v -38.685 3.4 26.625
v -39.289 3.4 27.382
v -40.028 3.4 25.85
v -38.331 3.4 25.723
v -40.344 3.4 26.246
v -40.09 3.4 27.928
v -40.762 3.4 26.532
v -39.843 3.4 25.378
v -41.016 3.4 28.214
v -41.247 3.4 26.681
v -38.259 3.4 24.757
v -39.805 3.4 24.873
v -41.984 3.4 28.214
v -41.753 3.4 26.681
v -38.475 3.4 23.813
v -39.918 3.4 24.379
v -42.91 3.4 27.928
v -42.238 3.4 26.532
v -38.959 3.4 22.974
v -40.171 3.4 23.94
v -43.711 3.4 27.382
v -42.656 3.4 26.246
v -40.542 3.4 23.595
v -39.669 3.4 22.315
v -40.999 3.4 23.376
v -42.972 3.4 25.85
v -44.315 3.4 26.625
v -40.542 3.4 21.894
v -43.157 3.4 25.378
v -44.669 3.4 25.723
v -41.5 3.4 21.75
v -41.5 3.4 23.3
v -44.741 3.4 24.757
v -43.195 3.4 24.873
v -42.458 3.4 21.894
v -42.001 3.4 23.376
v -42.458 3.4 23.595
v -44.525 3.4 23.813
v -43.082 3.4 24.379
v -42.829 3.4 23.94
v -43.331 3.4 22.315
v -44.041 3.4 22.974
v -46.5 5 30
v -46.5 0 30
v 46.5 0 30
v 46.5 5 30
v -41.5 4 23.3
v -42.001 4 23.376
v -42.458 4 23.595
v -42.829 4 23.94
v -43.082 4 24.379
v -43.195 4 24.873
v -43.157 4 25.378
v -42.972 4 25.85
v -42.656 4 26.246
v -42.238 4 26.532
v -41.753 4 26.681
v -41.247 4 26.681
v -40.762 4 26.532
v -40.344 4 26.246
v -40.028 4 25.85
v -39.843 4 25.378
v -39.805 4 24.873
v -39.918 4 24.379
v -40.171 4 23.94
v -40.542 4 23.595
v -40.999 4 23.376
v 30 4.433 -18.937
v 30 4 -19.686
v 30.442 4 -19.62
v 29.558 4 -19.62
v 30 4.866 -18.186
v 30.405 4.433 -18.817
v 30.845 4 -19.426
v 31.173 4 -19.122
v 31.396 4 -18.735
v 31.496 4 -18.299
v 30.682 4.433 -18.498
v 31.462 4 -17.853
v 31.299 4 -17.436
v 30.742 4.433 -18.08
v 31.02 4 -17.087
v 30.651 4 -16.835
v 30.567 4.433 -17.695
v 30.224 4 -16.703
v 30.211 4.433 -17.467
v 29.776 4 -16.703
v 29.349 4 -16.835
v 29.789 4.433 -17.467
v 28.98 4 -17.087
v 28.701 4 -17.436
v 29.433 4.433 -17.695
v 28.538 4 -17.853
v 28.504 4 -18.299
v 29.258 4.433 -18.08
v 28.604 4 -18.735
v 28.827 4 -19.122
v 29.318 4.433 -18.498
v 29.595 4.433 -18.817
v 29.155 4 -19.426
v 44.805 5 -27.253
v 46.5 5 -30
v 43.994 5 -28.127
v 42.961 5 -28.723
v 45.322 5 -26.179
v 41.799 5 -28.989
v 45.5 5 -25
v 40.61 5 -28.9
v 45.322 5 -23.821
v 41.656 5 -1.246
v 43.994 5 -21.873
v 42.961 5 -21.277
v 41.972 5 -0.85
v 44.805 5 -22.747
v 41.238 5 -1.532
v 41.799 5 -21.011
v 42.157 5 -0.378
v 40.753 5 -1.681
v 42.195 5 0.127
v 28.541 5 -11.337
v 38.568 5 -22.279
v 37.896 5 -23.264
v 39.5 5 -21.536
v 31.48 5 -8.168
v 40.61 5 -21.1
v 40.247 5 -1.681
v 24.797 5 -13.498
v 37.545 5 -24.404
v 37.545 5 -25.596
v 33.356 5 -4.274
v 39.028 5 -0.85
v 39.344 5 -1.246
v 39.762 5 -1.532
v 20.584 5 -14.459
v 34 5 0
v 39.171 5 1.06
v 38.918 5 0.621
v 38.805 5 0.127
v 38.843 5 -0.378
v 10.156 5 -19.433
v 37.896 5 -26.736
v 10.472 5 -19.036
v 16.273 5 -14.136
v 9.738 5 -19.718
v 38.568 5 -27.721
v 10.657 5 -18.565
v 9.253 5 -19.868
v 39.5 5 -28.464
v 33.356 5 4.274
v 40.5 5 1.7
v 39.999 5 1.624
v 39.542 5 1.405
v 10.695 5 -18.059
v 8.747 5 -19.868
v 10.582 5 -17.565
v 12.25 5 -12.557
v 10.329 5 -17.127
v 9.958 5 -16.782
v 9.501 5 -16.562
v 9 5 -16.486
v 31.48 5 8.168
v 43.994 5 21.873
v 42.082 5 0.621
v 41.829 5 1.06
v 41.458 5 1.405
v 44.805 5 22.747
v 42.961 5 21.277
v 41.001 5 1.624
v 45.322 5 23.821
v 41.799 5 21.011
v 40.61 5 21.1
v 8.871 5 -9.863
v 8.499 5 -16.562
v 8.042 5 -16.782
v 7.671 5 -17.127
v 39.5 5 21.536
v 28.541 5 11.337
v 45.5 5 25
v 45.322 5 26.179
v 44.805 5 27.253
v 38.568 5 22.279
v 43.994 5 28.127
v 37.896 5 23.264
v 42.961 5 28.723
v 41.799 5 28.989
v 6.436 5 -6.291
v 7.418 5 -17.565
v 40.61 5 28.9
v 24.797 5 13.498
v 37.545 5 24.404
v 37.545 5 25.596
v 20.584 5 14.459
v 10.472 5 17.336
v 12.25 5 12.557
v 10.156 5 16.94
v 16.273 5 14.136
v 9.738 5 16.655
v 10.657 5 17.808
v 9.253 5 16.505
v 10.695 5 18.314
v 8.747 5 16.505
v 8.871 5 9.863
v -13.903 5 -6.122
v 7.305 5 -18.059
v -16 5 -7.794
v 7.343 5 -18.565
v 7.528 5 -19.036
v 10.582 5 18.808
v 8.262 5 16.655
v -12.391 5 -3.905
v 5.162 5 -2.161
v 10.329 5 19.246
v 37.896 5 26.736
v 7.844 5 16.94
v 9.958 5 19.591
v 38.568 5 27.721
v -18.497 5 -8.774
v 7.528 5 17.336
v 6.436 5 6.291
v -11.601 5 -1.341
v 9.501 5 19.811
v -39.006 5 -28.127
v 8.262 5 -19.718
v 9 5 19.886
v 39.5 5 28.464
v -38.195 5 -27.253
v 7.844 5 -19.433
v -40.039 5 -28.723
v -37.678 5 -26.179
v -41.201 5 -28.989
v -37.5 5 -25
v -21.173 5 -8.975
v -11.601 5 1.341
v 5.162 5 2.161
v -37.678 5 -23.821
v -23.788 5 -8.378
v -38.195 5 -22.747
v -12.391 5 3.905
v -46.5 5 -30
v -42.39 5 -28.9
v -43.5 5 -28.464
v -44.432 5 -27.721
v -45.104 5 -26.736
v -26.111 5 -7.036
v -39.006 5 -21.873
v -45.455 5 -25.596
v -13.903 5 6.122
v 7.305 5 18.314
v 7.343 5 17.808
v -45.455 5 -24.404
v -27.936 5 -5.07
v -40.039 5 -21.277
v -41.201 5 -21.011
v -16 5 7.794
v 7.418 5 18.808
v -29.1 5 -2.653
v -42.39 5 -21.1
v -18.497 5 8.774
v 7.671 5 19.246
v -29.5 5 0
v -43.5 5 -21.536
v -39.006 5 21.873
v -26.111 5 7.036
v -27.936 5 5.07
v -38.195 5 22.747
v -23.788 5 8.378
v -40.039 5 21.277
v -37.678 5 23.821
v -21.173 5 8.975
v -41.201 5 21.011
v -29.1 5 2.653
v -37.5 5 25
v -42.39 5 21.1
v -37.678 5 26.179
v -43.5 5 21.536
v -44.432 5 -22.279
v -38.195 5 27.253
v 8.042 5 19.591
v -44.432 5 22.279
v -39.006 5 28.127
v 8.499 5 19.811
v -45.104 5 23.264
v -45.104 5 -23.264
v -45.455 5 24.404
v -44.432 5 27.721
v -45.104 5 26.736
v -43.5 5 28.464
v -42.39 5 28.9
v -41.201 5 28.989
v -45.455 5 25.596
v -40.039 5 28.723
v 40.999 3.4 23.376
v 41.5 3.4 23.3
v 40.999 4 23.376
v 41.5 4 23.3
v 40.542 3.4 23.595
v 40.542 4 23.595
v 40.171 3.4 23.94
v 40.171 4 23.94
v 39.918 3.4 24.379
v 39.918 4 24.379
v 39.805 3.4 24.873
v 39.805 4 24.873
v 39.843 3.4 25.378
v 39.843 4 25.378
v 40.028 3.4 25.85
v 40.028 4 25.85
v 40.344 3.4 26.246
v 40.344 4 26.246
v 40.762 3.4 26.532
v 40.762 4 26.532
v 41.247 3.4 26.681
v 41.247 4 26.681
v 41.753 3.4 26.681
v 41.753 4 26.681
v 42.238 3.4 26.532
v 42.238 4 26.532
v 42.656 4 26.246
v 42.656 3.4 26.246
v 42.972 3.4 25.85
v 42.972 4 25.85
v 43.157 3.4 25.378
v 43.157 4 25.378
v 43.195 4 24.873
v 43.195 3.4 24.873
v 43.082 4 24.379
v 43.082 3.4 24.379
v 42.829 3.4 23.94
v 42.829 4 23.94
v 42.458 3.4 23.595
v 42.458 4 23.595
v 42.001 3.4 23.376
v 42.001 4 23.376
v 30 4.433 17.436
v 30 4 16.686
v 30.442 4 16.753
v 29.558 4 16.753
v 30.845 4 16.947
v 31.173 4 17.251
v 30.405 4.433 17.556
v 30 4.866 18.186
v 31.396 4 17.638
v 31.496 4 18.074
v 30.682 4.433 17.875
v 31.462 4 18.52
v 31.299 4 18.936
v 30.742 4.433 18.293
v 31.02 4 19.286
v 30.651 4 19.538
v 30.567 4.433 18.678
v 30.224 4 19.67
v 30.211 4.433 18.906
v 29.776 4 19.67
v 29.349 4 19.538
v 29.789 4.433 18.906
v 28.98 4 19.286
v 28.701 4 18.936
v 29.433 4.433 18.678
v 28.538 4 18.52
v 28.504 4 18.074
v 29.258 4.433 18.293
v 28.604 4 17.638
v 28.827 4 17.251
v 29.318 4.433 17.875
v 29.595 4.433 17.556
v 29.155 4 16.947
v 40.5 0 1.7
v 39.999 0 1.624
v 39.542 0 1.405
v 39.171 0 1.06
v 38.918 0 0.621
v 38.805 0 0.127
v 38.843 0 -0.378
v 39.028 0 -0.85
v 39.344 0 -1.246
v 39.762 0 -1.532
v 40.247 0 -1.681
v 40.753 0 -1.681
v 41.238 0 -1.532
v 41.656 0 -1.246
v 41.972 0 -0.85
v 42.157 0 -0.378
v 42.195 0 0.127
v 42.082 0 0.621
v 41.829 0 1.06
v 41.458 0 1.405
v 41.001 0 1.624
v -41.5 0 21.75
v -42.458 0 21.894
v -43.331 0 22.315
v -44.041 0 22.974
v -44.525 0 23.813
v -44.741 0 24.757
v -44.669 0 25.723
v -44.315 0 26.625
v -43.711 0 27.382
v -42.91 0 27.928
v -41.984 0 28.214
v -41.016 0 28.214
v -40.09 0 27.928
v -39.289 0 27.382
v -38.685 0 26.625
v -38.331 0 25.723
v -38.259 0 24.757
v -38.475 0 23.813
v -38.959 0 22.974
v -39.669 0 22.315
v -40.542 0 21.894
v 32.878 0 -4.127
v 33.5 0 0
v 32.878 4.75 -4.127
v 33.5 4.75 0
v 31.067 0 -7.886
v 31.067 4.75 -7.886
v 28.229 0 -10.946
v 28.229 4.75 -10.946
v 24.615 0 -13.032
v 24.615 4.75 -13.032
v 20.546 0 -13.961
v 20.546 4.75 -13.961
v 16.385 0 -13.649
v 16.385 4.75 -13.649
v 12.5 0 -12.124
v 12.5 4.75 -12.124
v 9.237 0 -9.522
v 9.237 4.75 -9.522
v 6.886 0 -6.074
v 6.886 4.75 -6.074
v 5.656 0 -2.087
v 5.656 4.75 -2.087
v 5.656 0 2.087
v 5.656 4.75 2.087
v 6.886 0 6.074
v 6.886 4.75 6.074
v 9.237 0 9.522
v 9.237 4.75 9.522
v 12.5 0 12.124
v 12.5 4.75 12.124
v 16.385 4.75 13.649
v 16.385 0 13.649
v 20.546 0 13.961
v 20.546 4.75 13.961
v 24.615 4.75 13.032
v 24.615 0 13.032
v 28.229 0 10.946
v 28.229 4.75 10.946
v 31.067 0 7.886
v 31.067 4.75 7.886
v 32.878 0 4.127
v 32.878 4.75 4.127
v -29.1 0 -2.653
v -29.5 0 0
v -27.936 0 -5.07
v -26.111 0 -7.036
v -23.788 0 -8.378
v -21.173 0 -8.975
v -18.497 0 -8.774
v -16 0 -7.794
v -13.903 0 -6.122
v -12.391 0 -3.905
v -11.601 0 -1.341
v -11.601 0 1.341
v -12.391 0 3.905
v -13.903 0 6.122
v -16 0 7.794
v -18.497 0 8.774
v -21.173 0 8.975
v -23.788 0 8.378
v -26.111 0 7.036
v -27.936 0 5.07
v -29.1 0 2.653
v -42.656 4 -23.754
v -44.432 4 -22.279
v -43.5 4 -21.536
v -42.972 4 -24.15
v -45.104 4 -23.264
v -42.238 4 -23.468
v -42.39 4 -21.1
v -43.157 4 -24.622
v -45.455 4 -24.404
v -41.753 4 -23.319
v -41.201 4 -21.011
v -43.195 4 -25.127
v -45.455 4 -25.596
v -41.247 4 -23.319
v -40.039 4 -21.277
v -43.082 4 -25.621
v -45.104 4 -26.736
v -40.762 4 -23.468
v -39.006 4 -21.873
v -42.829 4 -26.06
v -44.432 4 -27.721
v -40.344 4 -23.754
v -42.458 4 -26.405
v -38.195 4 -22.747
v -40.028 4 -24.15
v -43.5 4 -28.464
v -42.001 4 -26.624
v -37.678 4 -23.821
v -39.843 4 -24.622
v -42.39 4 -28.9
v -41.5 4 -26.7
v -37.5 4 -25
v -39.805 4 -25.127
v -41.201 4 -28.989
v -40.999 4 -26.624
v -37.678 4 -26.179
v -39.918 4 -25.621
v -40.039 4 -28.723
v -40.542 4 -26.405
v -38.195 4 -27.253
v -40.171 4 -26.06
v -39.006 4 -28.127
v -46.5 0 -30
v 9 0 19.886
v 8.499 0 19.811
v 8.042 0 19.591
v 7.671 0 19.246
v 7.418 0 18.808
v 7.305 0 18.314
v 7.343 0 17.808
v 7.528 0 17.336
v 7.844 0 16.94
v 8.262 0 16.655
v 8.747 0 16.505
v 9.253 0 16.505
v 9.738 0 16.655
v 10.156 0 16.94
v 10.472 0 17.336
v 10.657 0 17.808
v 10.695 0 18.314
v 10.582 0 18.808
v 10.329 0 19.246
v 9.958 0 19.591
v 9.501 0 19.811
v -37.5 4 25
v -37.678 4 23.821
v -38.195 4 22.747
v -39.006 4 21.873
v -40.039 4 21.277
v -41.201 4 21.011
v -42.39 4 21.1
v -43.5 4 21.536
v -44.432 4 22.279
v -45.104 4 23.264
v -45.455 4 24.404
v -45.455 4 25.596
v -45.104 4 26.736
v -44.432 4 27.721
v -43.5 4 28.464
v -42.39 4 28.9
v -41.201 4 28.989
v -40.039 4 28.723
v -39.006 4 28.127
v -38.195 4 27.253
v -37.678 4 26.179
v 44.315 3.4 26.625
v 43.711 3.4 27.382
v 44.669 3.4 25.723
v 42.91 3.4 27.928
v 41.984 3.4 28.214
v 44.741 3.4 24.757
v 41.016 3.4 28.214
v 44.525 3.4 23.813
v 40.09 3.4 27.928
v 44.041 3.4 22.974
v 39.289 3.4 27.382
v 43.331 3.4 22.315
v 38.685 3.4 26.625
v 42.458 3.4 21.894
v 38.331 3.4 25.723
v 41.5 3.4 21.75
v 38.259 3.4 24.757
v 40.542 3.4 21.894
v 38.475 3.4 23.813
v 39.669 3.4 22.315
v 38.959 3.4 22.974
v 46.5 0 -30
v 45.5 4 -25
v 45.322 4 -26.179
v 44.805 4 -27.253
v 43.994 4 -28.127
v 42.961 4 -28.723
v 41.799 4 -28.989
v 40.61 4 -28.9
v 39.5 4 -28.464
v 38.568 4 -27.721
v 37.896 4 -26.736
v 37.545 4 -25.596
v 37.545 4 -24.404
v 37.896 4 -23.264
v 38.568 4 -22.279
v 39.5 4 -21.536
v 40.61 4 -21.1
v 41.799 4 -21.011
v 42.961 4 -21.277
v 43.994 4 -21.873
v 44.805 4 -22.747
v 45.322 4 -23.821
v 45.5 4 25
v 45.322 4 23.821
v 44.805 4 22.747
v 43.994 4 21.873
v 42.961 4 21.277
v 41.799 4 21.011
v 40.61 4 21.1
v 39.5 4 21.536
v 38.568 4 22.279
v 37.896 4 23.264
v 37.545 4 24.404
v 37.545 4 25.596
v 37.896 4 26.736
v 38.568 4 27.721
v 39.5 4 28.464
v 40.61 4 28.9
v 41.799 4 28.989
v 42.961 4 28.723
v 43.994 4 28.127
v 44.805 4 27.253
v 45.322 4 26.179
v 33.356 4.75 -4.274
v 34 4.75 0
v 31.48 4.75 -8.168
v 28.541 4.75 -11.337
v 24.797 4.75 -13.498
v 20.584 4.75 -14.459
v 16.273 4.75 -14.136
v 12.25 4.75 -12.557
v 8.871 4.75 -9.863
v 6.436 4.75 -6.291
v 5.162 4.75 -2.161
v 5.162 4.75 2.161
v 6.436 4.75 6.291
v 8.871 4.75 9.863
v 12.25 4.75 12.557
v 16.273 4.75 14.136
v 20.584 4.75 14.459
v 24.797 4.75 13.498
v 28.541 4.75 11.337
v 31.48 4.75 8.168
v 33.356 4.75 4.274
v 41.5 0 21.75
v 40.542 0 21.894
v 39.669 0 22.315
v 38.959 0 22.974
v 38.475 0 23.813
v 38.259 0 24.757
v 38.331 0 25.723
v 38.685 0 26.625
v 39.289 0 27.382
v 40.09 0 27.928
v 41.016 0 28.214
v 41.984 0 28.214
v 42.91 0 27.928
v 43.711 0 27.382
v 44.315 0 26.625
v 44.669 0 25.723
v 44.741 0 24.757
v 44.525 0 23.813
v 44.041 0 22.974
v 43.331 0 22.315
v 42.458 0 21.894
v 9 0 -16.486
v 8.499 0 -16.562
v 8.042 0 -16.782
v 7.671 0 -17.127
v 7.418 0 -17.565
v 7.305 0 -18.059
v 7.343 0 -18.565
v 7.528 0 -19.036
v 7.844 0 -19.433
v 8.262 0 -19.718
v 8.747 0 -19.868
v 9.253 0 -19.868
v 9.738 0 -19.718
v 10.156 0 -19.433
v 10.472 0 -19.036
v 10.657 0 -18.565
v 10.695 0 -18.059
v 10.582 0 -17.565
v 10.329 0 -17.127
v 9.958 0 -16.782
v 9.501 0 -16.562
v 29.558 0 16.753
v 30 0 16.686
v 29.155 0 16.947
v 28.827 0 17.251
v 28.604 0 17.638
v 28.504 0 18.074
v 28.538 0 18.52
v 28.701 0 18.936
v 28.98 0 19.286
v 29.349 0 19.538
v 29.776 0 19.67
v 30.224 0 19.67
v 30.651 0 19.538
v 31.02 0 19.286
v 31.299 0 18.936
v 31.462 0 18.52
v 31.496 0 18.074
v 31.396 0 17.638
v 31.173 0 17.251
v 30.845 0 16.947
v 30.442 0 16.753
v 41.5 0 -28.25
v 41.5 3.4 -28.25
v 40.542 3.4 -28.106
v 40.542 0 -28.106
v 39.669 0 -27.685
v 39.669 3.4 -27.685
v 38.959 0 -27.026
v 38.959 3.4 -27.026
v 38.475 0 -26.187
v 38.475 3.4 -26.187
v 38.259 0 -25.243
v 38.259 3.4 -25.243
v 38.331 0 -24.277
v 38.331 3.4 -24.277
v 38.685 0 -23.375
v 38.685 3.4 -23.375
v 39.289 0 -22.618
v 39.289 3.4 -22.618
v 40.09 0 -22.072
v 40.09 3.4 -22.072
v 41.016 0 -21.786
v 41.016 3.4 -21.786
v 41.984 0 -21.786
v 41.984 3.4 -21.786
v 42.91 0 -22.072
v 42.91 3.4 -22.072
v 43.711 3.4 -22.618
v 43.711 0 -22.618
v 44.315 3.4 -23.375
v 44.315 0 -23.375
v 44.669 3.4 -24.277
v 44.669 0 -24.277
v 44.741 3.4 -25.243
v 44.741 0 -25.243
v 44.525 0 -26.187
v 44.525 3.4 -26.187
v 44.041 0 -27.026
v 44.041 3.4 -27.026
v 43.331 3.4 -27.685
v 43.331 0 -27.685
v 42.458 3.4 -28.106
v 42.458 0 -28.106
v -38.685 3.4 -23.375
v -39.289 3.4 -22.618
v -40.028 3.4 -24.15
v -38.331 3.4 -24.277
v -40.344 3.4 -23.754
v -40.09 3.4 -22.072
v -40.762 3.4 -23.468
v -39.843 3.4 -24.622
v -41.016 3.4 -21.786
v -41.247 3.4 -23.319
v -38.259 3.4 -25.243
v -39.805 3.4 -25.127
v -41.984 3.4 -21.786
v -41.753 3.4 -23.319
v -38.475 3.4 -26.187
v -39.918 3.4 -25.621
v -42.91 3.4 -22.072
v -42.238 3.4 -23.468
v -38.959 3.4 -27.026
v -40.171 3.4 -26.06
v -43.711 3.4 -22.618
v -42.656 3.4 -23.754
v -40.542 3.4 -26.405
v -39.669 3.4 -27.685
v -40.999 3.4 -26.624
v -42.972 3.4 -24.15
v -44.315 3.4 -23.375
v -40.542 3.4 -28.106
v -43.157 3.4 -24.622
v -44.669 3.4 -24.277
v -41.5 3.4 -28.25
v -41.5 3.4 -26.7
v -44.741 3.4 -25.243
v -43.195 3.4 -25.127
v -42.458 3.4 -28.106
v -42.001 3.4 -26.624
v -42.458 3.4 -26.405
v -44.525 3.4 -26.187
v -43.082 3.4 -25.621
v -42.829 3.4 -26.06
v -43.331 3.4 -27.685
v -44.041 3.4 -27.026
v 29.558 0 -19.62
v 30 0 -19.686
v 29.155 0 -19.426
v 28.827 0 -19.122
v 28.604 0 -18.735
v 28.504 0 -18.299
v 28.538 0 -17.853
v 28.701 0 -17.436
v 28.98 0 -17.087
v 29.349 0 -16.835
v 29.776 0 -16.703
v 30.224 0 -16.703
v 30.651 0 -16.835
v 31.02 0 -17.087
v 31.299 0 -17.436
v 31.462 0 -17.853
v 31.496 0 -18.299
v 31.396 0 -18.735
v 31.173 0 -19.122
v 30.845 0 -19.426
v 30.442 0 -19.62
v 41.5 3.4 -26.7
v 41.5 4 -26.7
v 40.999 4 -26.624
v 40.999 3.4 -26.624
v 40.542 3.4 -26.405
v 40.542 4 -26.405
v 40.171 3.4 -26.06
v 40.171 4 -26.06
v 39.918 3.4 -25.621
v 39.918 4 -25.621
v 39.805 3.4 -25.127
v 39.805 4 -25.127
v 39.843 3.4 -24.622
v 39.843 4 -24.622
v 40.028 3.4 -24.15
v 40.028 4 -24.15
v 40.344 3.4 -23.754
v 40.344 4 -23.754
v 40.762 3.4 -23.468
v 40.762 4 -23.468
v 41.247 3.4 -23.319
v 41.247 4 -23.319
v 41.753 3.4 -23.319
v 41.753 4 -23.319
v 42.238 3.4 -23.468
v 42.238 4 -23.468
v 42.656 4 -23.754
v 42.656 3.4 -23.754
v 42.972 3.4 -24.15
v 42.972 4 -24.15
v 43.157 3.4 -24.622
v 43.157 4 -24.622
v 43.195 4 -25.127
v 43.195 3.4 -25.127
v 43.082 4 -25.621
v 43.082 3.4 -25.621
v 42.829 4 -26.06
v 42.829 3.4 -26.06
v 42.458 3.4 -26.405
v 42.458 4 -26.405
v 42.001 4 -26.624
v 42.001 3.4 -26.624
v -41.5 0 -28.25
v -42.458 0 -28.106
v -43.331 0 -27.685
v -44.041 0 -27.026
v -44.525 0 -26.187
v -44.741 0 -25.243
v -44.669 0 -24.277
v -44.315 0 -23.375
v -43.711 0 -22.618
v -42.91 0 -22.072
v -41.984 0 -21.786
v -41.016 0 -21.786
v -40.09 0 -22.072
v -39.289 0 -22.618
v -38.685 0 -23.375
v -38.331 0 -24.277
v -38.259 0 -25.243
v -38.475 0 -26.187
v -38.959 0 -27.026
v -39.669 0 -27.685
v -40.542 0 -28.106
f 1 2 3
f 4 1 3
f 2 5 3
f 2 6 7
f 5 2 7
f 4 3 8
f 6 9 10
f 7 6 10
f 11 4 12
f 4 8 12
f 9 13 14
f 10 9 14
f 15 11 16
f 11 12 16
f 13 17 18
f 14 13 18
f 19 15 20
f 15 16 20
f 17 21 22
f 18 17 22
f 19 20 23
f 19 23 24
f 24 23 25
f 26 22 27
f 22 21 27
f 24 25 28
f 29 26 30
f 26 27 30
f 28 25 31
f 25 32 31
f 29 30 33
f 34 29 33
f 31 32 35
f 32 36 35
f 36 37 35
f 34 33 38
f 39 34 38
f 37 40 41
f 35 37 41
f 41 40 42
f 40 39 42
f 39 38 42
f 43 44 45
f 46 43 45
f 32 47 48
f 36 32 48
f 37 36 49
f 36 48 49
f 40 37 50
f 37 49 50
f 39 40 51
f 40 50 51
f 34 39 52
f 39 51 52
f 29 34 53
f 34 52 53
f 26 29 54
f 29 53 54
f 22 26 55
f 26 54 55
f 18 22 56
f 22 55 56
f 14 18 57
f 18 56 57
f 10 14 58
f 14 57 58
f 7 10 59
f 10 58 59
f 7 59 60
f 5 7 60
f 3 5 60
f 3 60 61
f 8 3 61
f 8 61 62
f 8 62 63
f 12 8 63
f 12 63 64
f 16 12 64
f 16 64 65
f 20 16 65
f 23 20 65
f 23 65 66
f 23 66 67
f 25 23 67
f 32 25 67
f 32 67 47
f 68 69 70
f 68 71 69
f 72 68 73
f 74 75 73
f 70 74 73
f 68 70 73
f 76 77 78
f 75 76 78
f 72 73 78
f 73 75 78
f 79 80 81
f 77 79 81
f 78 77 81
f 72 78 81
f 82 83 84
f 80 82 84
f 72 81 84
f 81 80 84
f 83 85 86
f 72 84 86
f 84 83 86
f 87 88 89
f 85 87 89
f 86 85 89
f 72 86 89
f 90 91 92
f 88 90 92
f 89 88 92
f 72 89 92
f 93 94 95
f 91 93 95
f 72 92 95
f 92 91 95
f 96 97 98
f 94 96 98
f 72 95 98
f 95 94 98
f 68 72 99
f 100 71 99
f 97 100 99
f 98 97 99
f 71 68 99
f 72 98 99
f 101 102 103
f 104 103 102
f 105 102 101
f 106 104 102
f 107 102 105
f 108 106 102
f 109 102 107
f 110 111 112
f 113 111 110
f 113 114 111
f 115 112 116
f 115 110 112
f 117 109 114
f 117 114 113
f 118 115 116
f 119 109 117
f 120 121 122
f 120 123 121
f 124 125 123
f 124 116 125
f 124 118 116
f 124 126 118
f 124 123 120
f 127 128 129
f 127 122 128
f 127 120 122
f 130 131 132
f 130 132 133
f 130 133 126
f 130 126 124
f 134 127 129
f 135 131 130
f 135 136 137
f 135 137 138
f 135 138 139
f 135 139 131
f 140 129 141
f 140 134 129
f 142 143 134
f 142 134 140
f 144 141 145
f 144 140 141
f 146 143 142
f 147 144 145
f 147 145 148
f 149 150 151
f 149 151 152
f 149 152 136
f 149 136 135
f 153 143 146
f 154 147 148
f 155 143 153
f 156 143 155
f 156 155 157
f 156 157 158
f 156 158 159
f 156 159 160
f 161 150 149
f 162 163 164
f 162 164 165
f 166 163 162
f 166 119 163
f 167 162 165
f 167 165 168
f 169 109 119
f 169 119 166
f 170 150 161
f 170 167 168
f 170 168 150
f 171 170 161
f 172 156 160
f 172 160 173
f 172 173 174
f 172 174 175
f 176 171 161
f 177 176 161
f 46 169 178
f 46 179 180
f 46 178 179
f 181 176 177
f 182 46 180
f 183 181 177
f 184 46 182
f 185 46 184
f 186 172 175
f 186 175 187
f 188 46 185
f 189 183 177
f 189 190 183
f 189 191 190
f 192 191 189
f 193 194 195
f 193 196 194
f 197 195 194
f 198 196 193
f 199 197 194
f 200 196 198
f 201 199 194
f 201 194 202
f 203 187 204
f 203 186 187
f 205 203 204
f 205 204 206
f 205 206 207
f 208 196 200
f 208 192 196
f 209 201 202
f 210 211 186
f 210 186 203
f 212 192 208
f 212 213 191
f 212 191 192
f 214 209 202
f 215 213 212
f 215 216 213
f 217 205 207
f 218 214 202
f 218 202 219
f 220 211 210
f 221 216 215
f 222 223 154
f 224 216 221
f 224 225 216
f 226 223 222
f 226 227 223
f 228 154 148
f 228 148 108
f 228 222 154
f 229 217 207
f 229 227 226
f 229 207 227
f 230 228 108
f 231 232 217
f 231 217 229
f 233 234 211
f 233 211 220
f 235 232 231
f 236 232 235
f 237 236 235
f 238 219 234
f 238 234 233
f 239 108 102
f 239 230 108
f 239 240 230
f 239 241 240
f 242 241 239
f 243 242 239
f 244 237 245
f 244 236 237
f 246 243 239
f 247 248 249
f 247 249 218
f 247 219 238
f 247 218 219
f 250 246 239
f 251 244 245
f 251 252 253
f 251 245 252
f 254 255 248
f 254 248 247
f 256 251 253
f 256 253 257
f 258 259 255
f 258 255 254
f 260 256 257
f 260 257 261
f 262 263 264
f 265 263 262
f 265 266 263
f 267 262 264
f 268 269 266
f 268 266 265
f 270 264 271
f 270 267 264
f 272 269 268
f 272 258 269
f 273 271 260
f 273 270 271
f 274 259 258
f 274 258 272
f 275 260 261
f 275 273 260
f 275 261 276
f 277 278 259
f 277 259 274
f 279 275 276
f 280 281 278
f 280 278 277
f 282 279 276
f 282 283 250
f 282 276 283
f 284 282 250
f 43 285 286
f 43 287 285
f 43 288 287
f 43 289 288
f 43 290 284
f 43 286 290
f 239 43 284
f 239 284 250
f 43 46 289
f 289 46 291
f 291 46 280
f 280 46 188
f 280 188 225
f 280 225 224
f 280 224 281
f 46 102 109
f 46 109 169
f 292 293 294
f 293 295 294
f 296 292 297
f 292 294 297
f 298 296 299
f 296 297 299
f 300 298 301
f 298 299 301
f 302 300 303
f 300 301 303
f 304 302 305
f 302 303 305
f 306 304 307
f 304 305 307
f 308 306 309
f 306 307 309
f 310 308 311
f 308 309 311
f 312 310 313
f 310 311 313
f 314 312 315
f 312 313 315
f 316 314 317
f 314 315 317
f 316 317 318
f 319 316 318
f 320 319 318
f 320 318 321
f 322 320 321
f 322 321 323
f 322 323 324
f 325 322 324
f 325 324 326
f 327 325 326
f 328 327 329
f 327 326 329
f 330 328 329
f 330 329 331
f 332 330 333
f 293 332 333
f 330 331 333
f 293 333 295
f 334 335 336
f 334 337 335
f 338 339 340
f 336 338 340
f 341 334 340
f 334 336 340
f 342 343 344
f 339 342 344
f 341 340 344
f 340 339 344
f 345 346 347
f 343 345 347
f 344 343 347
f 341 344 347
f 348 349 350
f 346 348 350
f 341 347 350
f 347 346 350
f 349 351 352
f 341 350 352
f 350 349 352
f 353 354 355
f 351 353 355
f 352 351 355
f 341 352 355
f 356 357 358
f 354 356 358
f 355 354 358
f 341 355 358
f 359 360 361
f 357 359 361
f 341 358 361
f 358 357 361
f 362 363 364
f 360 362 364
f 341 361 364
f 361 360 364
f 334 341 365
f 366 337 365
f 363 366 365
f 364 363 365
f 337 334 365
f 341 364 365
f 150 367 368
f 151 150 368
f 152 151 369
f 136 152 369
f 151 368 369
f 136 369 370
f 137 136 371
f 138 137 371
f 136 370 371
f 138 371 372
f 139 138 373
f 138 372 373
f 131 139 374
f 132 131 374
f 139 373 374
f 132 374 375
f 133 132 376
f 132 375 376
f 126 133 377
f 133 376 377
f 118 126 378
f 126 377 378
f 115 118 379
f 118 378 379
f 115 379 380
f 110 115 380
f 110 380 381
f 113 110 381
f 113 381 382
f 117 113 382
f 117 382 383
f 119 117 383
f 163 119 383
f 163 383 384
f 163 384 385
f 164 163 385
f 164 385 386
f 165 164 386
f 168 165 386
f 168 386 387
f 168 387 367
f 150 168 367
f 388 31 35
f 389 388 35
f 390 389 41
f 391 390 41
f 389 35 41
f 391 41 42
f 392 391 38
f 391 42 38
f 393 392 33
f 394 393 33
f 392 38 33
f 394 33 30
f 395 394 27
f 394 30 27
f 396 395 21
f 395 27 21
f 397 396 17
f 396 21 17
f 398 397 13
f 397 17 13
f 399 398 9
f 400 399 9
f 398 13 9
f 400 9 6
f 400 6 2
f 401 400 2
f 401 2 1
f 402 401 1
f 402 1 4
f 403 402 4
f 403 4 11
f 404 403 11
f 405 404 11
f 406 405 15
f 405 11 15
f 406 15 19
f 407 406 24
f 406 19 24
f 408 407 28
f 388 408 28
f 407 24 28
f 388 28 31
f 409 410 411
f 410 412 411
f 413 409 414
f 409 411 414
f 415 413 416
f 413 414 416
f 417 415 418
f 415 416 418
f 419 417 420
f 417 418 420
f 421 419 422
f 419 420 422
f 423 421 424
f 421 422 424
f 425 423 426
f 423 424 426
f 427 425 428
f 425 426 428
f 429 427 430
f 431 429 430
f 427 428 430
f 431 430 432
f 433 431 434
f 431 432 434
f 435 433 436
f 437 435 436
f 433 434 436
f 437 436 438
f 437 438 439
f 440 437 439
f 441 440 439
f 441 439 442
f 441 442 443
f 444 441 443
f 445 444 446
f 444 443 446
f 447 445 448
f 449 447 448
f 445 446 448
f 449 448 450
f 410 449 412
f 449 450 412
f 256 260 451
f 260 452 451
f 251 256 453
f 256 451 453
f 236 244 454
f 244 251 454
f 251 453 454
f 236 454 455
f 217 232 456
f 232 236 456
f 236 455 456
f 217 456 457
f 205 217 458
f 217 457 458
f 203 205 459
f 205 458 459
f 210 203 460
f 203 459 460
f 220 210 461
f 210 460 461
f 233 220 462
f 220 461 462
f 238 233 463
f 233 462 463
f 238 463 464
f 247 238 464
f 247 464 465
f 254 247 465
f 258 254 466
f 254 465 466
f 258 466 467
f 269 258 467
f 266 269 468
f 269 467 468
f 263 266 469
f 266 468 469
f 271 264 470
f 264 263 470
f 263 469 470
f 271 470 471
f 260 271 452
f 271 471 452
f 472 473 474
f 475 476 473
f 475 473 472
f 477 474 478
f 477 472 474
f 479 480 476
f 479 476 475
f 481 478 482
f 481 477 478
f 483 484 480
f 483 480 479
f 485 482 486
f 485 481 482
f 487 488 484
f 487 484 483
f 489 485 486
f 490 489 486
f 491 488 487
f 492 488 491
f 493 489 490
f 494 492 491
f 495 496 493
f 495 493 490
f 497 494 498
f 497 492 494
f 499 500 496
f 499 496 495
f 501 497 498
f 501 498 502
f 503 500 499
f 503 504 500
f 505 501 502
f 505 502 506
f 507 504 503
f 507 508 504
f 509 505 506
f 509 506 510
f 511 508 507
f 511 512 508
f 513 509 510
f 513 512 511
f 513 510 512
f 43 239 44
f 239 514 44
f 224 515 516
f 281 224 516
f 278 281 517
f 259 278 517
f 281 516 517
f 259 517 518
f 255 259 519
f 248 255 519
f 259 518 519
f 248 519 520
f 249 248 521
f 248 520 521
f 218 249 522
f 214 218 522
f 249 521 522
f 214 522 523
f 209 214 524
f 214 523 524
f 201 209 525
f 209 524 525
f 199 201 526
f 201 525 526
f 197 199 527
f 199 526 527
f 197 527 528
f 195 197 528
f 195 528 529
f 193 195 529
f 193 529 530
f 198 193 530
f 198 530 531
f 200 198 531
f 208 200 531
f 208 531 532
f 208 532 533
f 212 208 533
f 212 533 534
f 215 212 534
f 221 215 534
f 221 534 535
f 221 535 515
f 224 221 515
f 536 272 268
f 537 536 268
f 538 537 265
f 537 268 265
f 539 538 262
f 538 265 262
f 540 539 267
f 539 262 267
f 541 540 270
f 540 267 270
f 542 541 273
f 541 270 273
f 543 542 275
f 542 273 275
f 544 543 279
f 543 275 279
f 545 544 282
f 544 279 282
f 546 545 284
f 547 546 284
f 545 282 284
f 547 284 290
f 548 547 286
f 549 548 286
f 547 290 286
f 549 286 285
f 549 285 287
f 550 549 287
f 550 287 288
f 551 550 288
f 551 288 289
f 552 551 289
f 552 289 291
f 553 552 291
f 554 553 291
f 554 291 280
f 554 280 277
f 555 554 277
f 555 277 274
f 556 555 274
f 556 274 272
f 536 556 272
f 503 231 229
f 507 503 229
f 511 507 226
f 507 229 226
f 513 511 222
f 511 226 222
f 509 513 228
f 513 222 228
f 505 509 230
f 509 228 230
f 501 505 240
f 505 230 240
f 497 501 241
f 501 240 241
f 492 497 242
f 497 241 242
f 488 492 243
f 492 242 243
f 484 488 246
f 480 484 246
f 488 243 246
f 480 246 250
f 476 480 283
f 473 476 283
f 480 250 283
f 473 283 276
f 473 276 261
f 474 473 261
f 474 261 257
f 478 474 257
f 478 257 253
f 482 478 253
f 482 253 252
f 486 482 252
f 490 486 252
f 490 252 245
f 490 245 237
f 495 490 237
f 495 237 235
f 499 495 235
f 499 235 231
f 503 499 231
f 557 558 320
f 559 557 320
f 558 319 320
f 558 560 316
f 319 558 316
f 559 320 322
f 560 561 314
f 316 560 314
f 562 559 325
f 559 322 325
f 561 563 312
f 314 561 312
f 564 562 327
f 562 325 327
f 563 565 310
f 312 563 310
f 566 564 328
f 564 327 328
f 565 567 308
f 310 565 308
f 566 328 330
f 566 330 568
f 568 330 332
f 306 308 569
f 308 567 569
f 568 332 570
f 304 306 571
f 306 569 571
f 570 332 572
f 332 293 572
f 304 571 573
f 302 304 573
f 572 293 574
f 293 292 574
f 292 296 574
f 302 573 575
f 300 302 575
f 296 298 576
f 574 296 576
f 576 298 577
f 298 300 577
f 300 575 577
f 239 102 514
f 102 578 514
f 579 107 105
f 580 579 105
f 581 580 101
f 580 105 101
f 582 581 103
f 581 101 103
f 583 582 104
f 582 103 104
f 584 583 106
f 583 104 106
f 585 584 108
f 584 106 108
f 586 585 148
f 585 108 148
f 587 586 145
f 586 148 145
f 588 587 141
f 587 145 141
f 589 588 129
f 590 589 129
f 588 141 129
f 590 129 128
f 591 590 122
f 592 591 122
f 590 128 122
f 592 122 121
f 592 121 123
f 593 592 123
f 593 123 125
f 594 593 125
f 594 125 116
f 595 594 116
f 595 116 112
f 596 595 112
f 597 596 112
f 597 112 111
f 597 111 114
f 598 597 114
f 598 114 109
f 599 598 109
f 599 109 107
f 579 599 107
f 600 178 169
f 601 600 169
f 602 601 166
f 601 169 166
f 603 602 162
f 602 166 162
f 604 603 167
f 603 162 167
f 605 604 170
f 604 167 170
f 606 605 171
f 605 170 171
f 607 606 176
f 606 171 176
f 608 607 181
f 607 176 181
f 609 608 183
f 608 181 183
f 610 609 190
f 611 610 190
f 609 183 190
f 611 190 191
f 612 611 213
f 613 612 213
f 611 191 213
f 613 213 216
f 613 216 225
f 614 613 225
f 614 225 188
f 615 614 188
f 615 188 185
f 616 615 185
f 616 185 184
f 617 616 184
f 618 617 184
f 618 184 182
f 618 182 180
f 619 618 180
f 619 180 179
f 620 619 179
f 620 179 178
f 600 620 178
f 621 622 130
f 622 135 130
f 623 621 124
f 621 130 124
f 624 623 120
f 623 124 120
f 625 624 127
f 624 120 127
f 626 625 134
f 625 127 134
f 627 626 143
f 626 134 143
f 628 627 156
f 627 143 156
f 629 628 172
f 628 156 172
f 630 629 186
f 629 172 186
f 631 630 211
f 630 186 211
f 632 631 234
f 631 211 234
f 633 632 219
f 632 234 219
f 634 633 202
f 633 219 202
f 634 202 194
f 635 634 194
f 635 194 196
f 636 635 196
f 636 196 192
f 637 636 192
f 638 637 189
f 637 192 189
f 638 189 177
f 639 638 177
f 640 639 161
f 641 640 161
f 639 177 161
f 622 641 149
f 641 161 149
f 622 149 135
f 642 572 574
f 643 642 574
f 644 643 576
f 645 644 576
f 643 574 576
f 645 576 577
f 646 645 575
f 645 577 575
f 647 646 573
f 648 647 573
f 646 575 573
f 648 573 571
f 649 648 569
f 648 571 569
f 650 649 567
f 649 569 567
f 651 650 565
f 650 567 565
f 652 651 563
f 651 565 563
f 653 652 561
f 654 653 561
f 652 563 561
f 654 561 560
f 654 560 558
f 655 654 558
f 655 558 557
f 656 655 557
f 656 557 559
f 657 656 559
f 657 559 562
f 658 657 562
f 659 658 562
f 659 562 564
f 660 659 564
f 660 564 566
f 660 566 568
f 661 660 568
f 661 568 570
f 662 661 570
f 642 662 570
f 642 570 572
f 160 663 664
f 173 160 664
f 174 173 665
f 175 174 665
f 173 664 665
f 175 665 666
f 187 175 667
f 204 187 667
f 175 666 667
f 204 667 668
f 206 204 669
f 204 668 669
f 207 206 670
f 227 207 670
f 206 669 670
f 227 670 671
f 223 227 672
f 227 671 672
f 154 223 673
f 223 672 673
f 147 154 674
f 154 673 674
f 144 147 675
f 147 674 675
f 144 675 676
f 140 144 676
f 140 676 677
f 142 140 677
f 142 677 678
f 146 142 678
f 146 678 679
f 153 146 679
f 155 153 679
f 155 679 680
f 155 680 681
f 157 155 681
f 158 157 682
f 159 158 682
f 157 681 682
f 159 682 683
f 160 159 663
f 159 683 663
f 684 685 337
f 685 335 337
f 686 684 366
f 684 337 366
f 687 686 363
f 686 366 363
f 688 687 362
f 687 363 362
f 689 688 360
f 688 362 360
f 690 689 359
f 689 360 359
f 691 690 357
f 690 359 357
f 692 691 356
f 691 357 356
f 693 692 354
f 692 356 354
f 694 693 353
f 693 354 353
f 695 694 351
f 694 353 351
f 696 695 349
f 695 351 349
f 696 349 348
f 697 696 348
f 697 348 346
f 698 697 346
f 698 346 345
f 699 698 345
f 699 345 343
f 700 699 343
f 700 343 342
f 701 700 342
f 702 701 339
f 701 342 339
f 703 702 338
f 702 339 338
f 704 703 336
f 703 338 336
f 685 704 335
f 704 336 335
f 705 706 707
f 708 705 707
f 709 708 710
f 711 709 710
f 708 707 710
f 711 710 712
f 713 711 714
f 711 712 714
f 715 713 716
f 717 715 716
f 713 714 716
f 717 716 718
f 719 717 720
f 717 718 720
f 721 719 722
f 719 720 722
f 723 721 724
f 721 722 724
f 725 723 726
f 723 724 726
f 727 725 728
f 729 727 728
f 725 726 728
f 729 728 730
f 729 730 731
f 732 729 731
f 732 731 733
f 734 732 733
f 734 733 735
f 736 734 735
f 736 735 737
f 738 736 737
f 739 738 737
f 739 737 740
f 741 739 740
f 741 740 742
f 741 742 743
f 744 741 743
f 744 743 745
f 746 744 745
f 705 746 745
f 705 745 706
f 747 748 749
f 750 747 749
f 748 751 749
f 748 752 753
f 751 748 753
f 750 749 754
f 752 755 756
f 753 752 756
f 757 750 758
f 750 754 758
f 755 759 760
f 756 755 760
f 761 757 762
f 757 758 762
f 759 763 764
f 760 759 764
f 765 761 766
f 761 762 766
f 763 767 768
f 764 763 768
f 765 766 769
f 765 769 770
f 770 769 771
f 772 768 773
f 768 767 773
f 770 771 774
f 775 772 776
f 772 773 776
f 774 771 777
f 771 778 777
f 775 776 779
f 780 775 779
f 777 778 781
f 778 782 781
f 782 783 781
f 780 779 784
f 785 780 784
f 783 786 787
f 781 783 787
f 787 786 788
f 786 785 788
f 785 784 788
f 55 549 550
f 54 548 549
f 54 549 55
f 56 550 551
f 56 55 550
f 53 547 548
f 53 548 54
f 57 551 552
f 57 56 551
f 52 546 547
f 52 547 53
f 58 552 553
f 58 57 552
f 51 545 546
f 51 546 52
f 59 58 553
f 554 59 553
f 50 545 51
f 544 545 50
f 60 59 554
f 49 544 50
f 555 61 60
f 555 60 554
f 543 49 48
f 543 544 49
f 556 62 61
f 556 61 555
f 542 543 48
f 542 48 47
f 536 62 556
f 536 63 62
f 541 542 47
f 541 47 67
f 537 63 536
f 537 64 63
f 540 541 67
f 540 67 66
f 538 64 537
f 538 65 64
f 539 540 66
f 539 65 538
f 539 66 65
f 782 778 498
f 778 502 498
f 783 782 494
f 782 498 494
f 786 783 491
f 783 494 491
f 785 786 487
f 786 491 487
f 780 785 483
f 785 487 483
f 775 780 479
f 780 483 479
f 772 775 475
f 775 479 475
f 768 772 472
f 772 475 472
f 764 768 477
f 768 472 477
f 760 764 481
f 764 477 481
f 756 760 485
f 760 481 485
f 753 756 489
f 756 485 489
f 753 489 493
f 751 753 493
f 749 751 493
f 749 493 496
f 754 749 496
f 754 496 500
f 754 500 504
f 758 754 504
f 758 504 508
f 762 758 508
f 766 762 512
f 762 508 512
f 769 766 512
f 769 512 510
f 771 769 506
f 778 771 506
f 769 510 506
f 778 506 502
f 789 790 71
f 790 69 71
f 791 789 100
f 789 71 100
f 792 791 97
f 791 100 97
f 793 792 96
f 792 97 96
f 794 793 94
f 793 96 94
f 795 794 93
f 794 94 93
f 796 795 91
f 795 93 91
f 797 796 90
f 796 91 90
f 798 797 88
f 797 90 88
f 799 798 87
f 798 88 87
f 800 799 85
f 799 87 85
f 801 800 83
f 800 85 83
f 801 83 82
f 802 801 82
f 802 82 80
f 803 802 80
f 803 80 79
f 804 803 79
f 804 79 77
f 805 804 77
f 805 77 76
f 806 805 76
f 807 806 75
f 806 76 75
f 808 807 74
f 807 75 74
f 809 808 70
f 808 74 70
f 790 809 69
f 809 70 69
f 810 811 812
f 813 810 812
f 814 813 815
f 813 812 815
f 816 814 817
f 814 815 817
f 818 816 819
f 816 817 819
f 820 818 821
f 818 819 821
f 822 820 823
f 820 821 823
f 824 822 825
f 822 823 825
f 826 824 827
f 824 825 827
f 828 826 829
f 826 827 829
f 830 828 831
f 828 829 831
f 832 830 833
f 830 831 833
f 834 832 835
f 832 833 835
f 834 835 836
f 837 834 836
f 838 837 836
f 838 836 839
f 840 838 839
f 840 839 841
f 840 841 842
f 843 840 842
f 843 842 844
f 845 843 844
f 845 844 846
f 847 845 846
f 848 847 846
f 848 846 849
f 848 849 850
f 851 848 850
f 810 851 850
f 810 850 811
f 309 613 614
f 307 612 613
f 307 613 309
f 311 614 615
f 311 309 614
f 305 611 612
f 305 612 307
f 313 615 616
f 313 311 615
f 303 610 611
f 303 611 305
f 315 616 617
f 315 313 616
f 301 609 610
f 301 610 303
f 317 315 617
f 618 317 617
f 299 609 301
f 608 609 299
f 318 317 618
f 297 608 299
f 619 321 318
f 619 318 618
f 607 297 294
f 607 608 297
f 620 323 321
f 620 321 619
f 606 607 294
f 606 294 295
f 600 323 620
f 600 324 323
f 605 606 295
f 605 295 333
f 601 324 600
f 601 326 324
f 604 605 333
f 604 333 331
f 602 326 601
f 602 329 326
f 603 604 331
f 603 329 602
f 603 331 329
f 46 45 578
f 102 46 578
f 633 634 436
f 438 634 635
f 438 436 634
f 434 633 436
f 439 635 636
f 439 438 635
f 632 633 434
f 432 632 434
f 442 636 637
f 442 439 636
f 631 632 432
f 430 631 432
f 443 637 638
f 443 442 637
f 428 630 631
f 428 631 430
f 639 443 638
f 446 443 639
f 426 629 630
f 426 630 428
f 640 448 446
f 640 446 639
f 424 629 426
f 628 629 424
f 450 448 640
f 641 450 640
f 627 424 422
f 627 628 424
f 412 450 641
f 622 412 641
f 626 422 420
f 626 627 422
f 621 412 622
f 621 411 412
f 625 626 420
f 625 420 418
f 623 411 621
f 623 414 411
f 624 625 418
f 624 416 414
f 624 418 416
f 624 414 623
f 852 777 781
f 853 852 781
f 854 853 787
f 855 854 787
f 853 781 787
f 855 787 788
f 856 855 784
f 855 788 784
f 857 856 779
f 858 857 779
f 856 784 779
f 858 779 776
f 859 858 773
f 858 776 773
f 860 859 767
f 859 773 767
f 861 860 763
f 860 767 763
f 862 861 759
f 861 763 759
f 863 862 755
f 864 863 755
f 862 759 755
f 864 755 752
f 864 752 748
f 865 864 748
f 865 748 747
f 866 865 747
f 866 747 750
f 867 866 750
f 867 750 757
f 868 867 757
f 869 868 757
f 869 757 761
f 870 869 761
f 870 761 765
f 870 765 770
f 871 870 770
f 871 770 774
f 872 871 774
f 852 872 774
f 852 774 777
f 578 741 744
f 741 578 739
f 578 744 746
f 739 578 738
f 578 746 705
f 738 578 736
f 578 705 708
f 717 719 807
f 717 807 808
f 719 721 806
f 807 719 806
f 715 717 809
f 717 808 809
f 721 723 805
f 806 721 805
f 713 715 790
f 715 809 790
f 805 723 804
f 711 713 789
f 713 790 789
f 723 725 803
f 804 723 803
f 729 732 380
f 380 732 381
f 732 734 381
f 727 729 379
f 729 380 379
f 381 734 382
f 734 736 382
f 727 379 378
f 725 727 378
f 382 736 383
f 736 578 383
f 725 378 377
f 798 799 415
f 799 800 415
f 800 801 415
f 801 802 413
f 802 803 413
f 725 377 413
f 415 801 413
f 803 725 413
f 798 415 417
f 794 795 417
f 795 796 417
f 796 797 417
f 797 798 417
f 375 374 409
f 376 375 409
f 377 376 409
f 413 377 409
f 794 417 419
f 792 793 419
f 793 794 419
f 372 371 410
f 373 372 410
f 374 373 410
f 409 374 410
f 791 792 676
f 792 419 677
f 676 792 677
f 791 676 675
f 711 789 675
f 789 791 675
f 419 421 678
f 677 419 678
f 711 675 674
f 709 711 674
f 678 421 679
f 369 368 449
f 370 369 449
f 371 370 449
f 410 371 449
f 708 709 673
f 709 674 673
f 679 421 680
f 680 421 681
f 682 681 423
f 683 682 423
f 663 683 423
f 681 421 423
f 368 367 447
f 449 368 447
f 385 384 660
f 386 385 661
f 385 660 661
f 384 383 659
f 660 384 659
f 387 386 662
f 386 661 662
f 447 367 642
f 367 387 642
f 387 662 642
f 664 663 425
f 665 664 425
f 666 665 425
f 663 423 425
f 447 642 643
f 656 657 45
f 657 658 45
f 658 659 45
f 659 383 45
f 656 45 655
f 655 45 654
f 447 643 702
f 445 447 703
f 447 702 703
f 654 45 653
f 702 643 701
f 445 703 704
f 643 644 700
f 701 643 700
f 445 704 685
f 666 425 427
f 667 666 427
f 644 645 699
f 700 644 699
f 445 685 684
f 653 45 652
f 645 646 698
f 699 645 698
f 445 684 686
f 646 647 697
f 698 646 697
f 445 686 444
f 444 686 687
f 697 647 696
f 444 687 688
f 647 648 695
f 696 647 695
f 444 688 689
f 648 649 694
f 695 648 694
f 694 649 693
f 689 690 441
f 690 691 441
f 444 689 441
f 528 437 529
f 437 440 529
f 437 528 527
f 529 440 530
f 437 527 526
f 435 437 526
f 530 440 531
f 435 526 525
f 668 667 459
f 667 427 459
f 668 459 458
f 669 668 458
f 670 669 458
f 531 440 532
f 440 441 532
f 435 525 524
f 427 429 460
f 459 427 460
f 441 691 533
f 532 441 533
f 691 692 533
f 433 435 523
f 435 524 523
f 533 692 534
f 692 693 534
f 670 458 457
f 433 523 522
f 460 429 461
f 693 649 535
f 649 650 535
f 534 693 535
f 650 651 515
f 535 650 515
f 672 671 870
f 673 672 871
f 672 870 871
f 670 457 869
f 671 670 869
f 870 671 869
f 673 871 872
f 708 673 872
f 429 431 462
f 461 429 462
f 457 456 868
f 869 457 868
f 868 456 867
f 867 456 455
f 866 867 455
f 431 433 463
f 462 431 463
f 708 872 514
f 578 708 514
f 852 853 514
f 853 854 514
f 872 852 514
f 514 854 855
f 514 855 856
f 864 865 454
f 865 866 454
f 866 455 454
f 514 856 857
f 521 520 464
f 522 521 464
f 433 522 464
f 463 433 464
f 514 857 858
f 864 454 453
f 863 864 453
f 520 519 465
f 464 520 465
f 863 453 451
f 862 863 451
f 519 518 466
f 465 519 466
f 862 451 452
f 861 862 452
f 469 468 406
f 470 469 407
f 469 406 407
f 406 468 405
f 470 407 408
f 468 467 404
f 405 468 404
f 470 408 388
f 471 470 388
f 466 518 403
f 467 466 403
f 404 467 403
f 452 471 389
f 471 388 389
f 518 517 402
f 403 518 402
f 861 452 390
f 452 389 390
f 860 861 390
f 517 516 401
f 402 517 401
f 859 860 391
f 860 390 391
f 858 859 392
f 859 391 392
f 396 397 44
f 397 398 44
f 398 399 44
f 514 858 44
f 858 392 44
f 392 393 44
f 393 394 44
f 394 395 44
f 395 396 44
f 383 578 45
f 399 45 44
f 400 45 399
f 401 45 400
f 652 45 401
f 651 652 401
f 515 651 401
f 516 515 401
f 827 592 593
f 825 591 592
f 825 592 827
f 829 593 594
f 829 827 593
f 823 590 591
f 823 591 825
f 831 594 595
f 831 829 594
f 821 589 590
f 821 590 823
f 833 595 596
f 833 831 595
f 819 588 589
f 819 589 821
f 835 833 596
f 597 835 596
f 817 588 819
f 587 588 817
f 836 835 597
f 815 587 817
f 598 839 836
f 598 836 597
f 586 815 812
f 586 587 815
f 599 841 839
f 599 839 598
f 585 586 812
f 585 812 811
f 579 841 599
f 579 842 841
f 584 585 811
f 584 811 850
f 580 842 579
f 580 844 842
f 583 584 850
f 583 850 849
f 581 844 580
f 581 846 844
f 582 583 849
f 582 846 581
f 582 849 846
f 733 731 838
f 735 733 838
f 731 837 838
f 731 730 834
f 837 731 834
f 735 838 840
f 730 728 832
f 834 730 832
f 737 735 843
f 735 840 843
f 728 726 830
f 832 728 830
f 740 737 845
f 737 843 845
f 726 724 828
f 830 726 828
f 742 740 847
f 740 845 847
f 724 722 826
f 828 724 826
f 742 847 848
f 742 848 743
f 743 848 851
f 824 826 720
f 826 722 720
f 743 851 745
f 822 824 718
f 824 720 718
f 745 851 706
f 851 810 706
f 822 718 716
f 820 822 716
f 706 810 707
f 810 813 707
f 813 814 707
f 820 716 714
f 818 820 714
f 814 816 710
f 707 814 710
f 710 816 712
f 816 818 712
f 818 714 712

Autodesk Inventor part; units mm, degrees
ref_plane "YZ Plane" through (0, 0, 0) normal (1, 0, 0) x (0, 1, 0)
ref_plane "XZ Plane" through (0, 0, 0) normal (0, 1, 0) x (-1, 0, 0)
ref_plane "XY Plane" through (0, 0, 0) normal (0, 0, 1) x (1, 0, 0)
sketch "Sketch1" plane through (0, 0, 0) normal (0, 1, 0) x (-1, 0, 0)
  line L0 (46.5, 30) -> (-46.5, 30)
  line L1 (-46.5, 30) -> (-46.5, -30)
  line L2 (-46.5, -30) -> (46.5, -30)
  line L3 (46.5, -30) -> (46.5, 30)
  line L4 (46.5, 30) -> (-46.5, -30) construction
  line L5 (-46.5, 30) -> (46.5, -30) construction
  circle A0 centre (20.5, 0) radius 9
  circle A1 centre (-19.5, 0) radius 12.5
  line L6 (152.1746, 0) -> (-152.1746, 0) construction
  line L7 (0, 58.0523) -> (0, -58.0523) construction
  point P0 (0, 0)
  dimension "d0" = 93
  dimension "d1" = 18
  dimension "d2" = 25
  dimension "d3" = 26
  dimension "d4" = 60
  dimension "d5" = 27
extrude "Extrusion1" add sketch "Sketch1" along normal blind 5
sketch "Sketch2" plane through (0, 0, 0) normal (0, -1, 0) x (1, 0, 0)
  line L0 (41.5, 25) -> (-41.5, 25) construction
  line L1 (-41.5, 25) -> (-41.5, -25) construction
  line L2 (-41.5, -25) -> (41.5, -25) construction
  line L3 (41.5, -25) -> (41.5, 25) construction
  line L4 (41.5, 25) -> (-41.5, -25) construction
  line L5 (-41.5, 25) -> (41.5, -25) construction
  line L6 (46.5, -30) -> (-46.5, -30) construction
  line L7 (-46.5, -30) -> (-46.5, 30) construction
  point P0 (0, 0)
  dimension "d11" = 5
  dimension "d12" = 5
hole "Hole1" at (41.5, 0, -25) at (-41.5, 0, -25) at (-41.5, 0, 25) at (41.5, 0, 25) direction (0, 1, 0) diameter 3.4 end through all counterbore diameter 6.5 counterbore depth 3.4 clearance for "Socket Head Cap Screw ISO 4762" size "M3" standard "ISO"
sketch "Sketch3" plane through (0, 5, 0) normal (0, 1, 0) x (1, 0, 0)
  circle A0 centre (-41.5, 25) radius 1.7 projected
  circle A1 centre (-41.5, 25) radius 4
  circle A2 centre (41.5, -25) radius 1.7 projected
  circle A3 centre (-41.5, -25) radius 1.7 projected
  circle A4 centre (-41.5, 25) radius 1.7 projected
  circle A5 centre (41.5, 25) radius 1.7 projected
  line L0 (46.5, -30) -> (46.5, 30) projected
  line L1 (46.5, 30) -> (-46.5, 30) projected
  line L2 (-46.5, 30) -> (-46.5, -30) projected
  line L3 (-46.5, -30) -> (46.5, -30) projected
  circle A6 centre (41.5, 25) radius 4
  circle A7 centre (-41.5, -25) radius 4
  circle A8 centre (41.5, -25) radius 4
  point P0 (0, 0)
  dimension "d22" = 83
  dimension "d25" = 50
  dimension "d28" = 8
extrude "Extrusion2" cut sketch "Sketch3" against normal blind 1 contours A0 | A1 | A2 | A3 | A5 | A6 | A7 | A8
sketch "Sketch4" plane through (0, 5, 0) normal (0, 1, 0) x (1, 0, 0)
  circle A0 centre (41.5, -25) radius 4 projected
  circle A1 centre (41.5, 25) radius 4 projected
  circle A2 centre (-41.5, -25) radius 4 projected
  circle A3 centre (-41.5, 25) radius 4 projected
  line L0 (46.5, -30) -> (46.5, 30) projected
  line L1 (46.5, 30) -> (-46.5, 30) projected
  line L2 (-46.5, 30) -> (-46.5, -30) projected
  line L3 (-46.5, -30) -> (46.5, -30) projected
  circle A4 centre (-20.5, 0) radius 9 projected
  circle A5 centre (19.5, 0) radius 12.5 projected
  circle A6 centre (19.5, 0) radius 14
  point P0 (0, 0)
  dimension "d31" = 28
extrude "Extrusion3" cut sketch "Sketch4" against normal through all contours A6
sketch "Sketch6" plane through (0, 5, 0) normal (0, 1, 0) x (1, 0, 0)
  circle A0 centre (19.5, 0) radius 14 projected
  circle A1 centre (19.5, 0) radius 21 construction
  line L0 (-65.1, 0) -> (65.1, 0) projected
  line L1 (19.5, 0) -> (9, -18.1865) construction
  point P0 (40.5, 0)
  point P1 (9, 18.1865)
  dimension "d40" = 42
  dimension "d43" = 360
  dimension "d66" = 60
hole "Hole2" at (40.5, 5, 0) at (9, 5, -18.1865) at (9, 5, 18.1865) direction (0, -1, 0) diameter 3.4 end through all clearance for "Socket Head Cap Screw ISO 4762" size "M3" standard "ISO"
sketch "Sketch9" plane through (0, 0, 0) normal (0, -1, 0) x (1, 0, 0)
  circle A0 centre (19.5, 0) radius 12.5 projected
  circle A1 centre (19.5, 0) radius 21 construction
  line L0 (-65.1, 0) -> (65.1, 0) projected
  line L1 (-1.5, 0) -> (19.5, 0) construction
  point P0 (0, 0)
  point P1 (30, 18.1865)
  point P2 (30, -18.1865)
  dimension "d53" = 42
  dimension "d63" = 360
hole "Hole3" at (30, 0, 18.1865) at (30, 0, -18.1865) direction (0, 1, 0) diameter 3 depth 4 tip angle 120
sketch "Sketch10" plane through (0, 5, 0) normal (0, 1, 0) x (1, 0, 0)
  circle A0 centre (19.5, 0) radius 14 projected
  circle A1 centre (19.5, 0) radius 14.5
  point P0 (0, 0)
  dimension "d70" = 0.5
extrude "Extrusion5" cut sketch "Sketch10" against normal blind 0.25
properties part number "plate"
